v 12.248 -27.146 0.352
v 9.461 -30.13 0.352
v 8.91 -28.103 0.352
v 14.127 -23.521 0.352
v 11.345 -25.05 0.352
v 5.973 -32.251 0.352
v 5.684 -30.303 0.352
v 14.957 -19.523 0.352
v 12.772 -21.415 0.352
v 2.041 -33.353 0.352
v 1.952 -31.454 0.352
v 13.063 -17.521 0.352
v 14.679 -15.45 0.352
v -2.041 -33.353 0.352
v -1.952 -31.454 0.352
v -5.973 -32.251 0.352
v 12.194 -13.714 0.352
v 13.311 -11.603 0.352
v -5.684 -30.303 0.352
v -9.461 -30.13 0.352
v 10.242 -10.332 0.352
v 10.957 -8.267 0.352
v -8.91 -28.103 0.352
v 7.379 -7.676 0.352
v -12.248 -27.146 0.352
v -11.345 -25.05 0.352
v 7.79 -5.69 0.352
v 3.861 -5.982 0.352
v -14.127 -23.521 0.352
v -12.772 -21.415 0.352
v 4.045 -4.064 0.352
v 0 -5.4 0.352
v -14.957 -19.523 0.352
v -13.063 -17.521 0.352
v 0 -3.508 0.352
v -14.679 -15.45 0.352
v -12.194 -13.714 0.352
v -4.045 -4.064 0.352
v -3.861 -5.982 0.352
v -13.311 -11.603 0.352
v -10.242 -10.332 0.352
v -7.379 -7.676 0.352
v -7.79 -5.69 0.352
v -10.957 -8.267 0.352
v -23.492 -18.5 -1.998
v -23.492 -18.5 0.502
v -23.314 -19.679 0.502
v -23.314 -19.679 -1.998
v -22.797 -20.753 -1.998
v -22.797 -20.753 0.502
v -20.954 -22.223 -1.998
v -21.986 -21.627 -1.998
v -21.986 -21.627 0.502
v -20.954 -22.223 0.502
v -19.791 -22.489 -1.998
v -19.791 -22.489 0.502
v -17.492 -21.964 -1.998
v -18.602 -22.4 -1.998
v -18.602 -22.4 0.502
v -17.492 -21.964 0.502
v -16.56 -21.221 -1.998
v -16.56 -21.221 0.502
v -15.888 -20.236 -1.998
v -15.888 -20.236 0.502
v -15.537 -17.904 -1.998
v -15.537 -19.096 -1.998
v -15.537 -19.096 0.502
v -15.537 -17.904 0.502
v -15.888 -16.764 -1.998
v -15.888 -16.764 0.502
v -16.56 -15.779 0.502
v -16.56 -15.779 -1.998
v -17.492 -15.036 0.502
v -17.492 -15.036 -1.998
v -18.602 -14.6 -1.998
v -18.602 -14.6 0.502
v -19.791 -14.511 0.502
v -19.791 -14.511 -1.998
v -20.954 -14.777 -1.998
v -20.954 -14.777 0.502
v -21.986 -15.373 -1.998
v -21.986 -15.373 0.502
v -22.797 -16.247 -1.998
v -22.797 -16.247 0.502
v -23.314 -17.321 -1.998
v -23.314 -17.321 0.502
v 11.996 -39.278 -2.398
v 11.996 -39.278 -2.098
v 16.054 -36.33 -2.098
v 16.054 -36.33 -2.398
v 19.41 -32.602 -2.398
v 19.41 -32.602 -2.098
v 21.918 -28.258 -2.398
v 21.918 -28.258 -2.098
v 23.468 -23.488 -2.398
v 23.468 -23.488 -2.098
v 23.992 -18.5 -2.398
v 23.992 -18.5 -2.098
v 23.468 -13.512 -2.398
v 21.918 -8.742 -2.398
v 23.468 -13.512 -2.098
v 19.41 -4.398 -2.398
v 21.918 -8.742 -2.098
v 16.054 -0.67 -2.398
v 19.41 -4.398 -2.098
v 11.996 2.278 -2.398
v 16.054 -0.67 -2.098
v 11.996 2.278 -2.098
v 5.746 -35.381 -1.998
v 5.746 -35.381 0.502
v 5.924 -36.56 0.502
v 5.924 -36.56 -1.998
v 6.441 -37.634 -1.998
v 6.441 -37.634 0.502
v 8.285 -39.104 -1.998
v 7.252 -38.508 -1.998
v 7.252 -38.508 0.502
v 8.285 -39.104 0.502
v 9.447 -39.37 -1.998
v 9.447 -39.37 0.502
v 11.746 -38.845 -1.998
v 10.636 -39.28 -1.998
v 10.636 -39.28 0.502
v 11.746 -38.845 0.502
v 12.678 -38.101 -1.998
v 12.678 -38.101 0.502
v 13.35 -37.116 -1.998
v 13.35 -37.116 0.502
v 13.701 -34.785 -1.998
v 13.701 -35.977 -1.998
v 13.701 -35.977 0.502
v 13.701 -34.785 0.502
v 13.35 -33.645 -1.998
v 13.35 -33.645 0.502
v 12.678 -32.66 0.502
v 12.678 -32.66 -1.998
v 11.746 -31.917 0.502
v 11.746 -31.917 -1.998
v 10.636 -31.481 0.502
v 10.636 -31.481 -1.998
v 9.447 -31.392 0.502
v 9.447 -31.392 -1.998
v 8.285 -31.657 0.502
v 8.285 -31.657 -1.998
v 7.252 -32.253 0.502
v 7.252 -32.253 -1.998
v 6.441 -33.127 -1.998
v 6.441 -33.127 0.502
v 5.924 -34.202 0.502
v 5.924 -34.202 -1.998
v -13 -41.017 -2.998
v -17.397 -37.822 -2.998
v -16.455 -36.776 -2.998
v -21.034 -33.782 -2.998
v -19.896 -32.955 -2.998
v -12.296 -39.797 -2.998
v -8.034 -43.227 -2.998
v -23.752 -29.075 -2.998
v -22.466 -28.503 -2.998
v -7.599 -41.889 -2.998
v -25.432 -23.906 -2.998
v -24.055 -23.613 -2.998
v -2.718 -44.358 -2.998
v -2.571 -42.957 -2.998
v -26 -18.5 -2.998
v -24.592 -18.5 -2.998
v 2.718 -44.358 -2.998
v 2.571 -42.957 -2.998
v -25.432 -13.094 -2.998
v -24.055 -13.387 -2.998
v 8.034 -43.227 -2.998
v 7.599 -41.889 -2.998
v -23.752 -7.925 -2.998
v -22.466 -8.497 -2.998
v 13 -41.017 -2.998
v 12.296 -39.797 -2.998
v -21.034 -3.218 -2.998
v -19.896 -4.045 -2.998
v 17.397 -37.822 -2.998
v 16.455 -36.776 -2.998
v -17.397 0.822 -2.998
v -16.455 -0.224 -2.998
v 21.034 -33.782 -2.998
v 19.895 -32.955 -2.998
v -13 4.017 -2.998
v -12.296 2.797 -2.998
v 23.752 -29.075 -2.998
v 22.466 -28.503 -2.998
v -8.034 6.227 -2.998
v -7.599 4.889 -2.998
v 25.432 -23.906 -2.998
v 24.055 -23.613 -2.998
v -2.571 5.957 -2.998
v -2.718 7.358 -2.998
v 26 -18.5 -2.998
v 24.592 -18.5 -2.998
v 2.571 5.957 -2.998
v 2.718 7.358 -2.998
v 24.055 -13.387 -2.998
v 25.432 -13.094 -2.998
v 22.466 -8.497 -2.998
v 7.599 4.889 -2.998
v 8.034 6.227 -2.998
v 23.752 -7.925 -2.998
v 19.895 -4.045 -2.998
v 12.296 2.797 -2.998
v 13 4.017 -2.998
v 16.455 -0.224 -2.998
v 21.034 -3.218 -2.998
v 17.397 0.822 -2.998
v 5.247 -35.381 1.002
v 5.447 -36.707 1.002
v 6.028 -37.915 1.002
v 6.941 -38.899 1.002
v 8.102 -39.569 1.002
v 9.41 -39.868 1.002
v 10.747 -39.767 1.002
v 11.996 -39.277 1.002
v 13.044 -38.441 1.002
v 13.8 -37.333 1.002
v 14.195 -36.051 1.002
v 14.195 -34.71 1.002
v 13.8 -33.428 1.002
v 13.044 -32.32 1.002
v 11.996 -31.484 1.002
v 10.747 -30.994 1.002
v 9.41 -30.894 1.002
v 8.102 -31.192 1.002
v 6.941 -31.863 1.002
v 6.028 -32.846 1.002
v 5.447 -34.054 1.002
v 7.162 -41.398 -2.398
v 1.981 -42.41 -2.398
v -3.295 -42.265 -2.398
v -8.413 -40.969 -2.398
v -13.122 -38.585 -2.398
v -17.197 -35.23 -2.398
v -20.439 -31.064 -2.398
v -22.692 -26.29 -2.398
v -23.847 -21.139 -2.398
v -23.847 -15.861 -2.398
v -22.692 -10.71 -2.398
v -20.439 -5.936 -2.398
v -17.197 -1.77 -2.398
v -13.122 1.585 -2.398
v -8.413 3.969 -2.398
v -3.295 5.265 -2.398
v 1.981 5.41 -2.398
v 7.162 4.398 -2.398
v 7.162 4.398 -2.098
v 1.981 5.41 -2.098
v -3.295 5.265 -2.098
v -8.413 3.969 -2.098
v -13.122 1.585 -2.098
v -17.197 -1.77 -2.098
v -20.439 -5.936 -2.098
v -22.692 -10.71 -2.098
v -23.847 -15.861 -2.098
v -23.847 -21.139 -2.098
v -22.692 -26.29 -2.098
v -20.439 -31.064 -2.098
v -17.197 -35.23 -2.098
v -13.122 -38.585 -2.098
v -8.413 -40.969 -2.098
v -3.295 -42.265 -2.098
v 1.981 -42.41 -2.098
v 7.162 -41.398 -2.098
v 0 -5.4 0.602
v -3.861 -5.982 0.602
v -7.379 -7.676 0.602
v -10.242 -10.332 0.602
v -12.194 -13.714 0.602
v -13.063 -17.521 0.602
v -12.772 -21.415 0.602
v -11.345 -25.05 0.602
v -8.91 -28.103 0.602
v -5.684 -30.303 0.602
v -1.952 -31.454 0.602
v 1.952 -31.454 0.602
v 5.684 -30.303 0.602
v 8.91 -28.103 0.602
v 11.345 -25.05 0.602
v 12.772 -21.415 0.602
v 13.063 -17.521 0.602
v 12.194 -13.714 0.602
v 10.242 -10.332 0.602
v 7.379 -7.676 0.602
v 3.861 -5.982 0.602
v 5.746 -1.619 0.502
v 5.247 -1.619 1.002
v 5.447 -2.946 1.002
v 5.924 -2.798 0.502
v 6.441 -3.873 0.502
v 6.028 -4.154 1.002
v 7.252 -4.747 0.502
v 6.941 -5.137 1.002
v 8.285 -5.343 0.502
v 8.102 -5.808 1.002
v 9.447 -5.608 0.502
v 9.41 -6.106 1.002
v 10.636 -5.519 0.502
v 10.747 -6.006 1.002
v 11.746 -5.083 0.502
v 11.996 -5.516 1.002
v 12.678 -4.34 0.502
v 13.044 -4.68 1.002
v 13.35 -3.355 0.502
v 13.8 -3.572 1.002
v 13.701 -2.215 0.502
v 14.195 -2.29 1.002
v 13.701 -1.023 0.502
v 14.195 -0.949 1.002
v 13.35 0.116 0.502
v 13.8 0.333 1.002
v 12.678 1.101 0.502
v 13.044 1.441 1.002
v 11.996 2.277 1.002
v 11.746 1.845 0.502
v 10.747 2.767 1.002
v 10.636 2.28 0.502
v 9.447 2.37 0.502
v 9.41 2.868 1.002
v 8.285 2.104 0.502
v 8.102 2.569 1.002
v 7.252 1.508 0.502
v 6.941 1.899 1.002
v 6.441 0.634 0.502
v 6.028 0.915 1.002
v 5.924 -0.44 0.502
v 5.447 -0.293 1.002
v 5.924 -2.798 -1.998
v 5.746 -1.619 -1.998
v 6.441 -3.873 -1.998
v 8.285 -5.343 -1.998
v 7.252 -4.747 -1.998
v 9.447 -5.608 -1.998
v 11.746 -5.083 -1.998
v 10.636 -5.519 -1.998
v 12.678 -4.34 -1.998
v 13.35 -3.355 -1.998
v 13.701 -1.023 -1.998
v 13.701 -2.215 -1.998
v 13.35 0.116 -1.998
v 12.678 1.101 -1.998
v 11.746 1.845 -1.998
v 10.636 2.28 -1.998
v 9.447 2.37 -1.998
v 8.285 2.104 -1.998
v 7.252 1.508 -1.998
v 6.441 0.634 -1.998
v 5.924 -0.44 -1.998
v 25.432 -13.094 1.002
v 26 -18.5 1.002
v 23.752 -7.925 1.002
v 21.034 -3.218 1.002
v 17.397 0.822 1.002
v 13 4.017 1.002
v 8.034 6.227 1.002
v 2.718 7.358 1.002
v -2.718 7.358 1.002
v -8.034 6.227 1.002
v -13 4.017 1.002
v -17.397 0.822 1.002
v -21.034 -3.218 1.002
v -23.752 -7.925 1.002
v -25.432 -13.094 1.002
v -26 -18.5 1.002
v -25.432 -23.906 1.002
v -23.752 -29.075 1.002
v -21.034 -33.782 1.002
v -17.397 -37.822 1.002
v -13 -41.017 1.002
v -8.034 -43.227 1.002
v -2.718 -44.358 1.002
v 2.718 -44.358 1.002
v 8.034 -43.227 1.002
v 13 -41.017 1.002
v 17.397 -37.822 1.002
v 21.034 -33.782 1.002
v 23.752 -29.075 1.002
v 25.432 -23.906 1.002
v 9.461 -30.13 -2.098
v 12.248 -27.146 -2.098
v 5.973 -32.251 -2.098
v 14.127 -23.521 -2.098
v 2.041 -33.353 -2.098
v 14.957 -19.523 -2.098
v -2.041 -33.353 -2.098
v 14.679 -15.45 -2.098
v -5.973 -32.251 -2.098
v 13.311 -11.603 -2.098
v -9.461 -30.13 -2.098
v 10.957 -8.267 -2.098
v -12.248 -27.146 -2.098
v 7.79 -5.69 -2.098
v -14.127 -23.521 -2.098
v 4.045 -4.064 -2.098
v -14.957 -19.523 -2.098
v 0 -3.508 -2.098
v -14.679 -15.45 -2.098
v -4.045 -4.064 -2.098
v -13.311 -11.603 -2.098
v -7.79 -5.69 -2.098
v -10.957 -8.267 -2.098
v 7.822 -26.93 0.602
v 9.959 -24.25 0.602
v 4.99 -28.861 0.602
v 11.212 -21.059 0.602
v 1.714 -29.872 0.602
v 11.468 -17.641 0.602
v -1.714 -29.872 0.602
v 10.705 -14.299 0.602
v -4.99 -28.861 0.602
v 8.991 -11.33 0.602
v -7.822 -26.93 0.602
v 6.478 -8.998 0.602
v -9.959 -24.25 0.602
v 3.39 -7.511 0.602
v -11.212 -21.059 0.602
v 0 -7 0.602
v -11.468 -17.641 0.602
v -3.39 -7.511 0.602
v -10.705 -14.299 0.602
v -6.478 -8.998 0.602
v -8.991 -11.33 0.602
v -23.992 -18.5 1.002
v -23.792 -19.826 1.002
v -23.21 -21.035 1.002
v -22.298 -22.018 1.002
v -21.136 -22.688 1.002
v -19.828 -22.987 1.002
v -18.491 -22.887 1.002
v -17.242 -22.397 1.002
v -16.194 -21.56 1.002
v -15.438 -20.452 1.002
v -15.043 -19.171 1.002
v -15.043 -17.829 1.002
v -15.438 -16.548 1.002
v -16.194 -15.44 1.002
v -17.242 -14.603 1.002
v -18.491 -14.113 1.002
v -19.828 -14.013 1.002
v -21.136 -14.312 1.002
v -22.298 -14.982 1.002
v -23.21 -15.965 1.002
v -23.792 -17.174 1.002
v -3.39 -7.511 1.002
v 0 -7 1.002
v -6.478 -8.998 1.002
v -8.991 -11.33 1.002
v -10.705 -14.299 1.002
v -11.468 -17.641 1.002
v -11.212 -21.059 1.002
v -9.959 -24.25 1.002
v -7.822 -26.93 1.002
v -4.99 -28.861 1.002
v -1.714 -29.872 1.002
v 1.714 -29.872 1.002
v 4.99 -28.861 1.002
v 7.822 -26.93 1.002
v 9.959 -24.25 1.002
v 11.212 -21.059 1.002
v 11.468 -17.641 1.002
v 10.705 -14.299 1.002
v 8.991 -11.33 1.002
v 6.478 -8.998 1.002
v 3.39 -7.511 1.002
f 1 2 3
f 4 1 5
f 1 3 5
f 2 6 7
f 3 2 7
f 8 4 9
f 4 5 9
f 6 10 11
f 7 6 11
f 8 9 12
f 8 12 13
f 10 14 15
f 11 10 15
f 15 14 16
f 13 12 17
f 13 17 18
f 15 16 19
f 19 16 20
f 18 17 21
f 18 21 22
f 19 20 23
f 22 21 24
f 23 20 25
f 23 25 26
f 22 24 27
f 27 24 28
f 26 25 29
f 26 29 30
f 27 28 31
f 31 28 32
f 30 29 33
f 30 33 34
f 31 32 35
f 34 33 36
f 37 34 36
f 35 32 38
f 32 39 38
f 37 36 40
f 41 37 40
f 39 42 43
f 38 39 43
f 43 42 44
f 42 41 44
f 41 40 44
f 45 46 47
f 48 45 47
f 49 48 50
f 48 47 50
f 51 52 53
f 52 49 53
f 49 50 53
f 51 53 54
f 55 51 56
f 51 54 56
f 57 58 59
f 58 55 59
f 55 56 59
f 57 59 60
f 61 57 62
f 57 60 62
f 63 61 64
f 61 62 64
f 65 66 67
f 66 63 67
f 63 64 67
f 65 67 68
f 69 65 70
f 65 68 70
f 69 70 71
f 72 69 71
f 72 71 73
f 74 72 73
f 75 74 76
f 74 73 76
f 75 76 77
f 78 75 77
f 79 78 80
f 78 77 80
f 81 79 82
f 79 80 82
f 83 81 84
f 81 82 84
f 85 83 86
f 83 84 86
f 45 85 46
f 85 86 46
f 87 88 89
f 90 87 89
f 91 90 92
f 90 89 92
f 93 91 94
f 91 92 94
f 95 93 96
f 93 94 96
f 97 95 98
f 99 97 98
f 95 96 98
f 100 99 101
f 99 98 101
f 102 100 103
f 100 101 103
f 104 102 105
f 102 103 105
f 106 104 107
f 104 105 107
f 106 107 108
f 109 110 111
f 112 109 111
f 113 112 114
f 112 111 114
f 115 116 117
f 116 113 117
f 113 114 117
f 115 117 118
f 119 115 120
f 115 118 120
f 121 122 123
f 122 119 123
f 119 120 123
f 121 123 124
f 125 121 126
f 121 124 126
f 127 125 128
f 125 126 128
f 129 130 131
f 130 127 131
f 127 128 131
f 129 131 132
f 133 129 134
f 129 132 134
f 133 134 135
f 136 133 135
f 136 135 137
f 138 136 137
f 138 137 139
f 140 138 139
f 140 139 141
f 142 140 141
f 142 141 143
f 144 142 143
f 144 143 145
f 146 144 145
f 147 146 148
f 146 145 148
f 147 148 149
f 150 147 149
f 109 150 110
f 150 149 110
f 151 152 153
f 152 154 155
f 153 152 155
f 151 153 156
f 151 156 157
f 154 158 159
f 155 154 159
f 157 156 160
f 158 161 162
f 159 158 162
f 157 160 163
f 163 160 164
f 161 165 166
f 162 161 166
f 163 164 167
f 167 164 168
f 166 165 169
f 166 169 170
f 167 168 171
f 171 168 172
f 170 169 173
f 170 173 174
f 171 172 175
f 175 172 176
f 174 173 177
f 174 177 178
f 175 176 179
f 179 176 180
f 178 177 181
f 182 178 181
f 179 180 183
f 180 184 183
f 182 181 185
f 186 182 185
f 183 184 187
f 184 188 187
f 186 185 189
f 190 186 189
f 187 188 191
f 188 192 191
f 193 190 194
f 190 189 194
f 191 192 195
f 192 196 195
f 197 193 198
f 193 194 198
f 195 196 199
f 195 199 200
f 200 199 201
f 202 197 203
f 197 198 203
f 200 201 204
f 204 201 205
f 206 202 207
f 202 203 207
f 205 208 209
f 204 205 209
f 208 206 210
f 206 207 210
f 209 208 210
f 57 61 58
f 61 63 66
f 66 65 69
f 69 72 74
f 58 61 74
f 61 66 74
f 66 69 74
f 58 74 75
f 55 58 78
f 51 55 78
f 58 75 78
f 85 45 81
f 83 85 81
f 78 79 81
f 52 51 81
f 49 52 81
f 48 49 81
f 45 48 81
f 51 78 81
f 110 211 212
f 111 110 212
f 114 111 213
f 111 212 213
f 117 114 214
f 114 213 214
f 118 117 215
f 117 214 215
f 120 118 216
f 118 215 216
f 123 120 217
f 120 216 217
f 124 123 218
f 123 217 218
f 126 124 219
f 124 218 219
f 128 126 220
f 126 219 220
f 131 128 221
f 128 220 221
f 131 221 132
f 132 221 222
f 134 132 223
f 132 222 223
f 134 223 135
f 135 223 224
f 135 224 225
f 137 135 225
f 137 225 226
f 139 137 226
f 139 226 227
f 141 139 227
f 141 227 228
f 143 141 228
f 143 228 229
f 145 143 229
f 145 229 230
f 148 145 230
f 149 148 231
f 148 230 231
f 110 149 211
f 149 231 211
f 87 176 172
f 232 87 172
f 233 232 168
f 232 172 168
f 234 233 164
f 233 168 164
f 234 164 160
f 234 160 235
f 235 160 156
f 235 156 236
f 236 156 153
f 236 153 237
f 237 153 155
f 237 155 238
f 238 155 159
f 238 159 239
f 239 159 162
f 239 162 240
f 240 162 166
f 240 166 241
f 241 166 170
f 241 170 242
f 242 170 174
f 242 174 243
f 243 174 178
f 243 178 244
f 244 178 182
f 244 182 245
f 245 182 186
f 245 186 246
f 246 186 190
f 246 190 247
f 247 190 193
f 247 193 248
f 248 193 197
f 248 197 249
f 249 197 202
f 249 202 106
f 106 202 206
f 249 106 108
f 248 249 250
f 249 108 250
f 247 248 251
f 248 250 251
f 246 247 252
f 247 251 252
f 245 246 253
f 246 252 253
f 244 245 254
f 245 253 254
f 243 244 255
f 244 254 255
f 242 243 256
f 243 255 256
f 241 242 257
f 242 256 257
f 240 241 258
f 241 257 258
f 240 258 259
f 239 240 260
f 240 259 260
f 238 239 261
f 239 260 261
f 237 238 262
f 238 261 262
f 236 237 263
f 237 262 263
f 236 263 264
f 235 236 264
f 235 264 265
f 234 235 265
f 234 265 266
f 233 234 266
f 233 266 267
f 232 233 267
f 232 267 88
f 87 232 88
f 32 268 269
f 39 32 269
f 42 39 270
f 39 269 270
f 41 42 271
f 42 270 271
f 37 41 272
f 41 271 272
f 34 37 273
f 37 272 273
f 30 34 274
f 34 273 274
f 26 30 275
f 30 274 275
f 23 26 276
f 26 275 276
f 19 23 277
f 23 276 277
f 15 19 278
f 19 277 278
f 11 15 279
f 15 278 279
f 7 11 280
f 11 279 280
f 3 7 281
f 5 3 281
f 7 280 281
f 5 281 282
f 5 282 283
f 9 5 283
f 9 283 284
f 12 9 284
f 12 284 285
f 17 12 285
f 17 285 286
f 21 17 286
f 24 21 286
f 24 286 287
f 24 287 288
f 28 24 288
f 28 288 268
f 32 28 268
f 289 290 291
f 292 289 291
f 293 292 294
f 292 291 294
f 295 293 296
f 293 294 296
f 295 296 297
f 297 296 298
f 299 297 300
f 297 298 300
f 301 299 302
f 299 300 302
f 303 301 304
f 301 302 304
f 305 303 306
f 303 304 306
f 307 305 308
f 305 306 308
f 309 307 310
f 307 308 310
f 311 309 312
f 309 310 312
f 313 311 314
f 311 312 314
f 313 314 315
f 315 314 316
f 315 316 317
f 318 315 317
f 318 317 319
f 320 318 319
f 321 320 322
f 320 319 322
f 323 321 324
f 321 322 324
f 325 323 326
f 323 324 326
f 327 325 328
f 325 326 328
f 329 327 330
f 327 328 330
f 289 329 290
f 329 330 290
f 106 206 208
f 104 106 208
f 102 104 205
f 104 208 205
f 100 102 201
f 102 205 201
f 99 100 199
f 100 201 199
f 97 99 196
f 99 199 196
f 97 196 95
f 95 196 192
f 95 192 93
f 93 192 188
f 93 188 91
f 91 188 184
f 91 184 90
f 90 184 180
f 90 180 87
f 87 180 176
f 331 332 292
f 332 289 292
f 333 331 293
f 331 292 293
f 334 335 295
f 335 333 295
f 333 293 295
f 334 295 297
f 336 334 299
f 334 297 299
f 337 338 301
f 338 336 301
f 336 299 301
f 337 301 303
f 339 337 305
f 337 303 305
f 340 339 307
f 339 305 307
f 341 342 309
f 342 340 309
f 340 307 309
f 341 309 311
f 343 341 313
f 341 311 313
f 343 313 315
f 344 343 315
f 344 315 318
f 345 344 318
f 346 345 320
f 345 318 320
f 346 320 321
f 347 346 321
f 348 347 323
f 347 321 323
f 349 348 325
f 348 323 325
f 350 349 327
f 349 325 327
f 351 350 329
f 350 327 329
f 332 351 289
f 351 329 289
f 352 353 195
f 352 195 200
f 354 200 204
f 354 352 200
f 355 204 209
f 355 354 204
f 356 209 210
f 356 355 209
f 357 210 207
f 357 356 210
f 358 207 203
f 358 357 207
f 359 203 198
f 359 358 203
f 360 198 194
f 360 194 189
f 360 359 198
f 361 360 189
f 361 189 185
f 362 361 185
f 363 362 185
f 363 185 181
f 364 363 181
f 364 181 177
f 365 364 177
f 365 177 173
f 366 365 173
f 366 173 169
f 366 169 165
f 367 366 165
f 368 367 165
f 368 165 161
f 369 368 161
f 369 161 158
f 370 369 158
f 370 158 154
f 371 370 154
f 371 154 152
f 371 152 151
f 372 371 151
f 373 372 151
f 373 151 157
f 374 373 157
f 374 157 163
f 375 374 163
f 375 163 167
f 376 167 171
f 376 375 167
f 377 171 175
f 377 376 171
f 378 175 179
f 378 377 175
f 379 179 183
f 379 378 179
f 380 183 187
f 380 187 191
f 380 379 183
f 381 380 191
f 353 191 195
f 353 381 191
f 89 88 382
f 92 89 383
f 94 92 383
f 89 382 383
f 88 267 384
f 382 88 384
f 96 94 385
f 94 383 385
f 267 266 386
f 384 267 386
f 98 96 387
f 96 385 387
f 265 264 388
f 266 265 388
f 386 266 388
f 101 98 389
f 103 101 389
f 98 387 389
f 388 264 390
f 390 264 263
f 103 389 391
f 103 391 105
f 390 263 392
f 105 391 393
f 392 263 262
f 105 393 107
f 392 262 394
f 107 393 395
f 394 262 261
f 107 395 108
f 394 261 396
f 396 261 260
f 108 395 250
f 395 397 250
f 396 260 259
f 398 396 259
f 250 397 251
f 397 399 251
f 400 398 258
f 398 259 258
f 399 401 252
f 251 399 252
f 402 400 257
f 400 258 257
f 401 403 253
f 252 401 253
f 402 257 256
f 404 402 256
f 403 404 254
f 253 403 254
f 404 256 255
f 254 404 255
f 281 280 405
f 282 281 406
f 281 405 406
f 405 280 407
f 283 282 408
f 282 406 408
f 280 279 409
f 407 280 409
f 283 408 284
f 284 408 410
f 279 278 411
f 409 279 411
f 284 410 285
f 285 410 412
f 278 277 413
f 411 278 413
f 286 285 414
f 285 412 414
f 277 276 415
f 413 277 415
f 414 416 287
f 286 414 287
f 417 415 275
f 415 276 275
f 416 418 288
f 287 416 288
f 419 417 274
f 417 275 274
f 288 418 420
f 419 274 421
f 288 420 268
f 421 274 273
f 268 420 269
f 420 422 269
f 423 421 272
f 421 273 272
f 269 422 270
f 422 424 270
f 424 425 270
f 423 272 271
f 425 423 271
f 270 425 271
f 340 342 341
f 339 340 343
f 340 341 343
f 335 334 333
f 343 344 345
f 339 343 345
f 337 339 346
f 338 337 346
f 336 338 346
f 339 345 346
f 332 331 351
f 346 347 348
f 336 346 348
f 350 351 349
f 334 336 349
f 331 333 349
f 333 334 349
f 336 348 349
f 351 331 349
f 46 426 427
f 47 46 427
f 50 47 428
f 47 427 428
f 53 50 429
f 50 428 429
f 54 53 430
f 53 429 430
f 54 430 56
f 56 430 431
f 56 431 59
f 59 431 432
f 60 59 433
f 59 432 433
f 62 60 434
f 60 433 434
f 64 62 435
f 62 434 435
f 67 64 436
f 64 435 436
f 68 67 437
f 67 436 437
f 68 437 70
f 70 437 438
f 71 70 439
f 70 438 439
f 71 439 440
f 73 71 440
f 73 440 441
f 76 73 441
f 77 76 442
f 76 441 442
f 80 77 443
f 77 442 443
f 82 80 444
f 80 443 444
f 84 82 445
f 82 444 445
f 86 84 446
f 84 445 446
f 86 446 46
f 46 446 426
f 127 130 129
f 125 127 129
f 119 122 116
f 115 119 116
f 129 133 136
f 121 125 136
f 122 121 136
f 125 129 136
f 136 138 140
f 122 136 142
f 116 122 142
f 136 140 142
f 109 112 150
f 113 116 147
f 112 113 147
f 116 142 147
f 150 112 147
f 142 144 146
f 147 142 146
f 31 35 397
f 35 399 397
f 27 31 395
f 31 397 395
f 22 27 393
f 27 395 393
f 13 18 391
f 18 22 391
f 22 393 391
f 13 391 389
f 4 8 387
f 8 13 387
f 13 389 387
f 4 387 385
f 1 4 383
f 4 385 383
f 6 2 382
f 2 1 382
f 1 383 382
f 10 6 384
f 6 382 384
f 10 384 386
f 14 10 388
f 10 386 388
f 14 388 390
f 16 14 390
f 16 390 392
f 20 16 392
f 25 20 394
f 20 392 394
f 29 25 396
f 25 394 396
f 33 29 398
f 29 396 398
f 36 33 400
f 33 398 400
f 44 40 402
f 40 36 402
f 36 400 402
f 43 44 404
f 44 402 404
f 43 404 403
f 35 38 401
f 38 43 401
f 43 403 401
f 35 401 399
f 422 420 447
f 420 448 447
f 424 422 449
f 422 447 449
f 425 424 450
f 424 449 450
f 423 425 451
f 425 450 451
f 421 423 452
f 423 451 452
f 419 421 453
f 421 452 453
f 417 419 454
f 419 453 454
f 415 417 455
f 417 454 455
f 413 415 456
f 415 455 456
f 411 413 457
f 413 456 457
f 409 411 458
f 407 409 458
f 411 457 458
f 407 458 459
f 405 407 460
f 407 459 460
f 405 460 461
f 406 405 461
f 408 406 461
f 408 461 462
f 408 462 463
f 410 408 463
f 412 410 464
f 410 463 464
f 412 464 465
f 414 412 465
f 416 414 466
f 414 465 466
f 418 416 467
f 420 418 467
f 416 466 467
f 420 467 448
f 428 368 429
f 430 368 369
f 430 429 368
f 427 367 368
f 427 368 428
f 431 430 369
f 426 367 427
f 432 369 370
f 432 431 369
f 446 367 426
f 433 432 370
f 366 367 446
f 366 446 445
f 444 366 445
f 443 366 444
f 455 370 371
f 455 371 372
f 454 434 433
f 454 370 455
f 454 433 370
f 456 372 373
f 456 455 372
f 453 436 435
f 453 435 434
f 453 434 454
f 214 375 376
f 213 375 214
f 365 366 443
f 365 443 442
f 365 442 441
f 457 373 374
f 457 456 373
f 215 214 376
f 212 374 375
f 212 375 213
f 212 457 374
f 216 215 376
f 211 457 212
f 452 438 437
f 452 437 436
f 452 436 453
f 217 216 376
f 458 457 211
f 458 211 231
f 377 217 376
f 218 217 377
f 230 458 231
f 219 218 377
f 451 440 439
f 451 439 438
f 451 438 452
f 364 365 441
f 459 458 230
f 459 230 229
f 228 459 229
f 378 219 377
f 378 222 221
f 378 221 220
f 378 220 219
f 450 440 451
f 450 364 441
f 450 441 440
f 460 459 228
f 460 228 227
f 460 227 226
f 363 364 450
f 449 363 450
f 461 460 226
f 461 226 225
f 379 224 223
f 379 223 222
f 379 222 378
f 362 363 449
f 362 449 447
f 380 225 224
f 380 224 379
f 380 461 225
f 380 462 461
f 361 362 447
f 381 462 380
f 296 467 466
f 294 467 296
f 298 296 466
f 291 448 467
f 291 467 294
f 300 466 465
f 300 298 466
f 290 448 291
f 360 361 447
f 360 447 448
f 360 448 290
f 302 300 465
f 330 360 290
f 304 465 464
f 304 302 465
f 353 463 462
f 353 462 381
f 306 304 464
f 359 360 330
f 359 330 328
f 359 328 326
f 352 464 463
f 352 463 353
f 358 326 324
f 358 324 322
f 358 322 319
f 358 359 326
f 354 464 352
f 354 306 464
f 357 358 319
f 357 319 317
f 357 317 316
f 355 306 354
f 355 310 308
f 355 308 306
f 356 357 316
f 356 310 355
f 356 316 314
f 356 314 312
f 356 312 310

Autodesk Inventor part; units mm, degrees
ref_plane "YZ Plane" through (0, 0, 0) normal (1, 0, 0) x (0, 1, 0)
ref_plane "XZ Plane" through (0, 0, 0) normal (0, 1, 0) x (-1, 0, 0)
ref_plane "XY Plane" through (0, 0, 0) normal (0, 0, 1) x (1, 0, 0)
ref_plane "Arbeitsebene1" through (0, -18.5, -1.048) normal (1, 0, 0) x (0, 0, -1)
sketch "Skizze1" plane through (0, -18.5, -1.048) normal (1, 0, 0) x (0, 0, -1)
  line L0 (-1.65, 12.5) -> (-1.5, 12.5)
  line L1 (-1.5, -12.5) -> (-1.5, 12.5) projected
  line L2 (-1.65, 12.5) -> (-1.65, -12.5) projected
  line L3 (8.4324, 0) -> (-3.3304, 0)
  line L4 (-1.6429, 13.1) -> (-1.65, 13.1)
  line L5 (-1.65, 13.1) -> (-1.65, 11.5)
  line L6 (-1.65, 11.5) -> (-2.05, 11.5)
  line L7 (-2.05, 11.5) -> (-2.05, 23.9922)
  line L8 (-2.05, 23.9922) -> (1.05, 23.9922)
  line L9 (1.05, 23.9922) -> (1.05, 14.9922)
  line L10 (1.552, 13.5) -> (-1.048, 13.5) construction
  line L11 (-1.65, 13.1) -> (-1.4, 13.1)
  line L12 (-1.4, 13.1) -> (-1.4, 14.9922)
  line L13 (-1.4, 14.9922) -> (1.05, 14.9922)
  point P0 (-1.048, 18.5)
  dimension "d0" = 0.4
  dimension "d1" = 3.1
  dimension "d2" = 9
  dimension "d3" = 0.6
  dimension "d4" = 0
  dimension "d5" = 1
  dimension "d6" = 0.25
revolve "Umdrehung1" add sketch "Skizze1" angle 360 about axis through (0, -18.5, -9.4804) along (0, 0, 1) contours L2 L6 L7 L8 L9 L13 L12 L11 L4 L5
sketch "Skizze2" plane through (0, -18.5, 1.002) normal (0, 0, -1) x (-1, 0, 0)
  circle A0 centre (0, 0) radius 14.9922 projected
  circle A1 centre (0, 0) radius 23.9922 projected
  line L0 (19.4922, 0) -> (-9.7461, -16.8807) construction
  line L1 (-9.7461, -16.8807) -> (-9.7461, 16.8807) construction
  line L2 (-9.7461, 16.8807) -> (19.4922, 0) construction
  circle A2 centre (19.4922, 0) radius 4
  circle A3 centre (-9.7461, -16.8807) radius 4
  circle A4 centre (-9.7461, 16.8807) radius 4
  point P0 (0, 18.5)
  dimension "d8" = 47.9844
  dimension "d9" = 29.9844
  dimension "d10" = 19.4922
  dimension "d11" = 8
  dimension "d12" = 8
  dimension "d13" = 8
extrude "Extrusion1" cut sketch "Skizze2" along normal blind 3 contours A2 | A3 | A4
chamfer "Fase1" distance 0.5 angle 45 3 edges at (13.7461, -1.6193, 1.002) (13.7461, -35.3807, 1.002) (-15.4922, -18.5, 1.002)
sketch "Skizze3" plane through (0, -18.5, 1.002) normal (0, 0, 1) x (1, 0, 0)
  arc A0 (11.9961, -20.7778) -> (11.9961, 20.7778) centre (0, 0) ccw projected
  circle A1 centre (0, 0) radius 23.9922
  circle A2 centre (0, 0) radius 26
  point P0 (0, 18.5)
  point P1 (11.9961, -20.7778)
  point P2 (11.9961, 20.7778)
  dimension "d19" = 52
extrude "Extrusion2" add sketch "Skizze3" against normal blind 4
chamfer "Fase2" distance 0.6 angle 45 1 edges at (-11.9961, -39.2778, -2.998)
equation "\"d10\" = 0.25 * d9 + 0.25 * d8"
properties part number "02_SMLM_Holdre_Bottom"
